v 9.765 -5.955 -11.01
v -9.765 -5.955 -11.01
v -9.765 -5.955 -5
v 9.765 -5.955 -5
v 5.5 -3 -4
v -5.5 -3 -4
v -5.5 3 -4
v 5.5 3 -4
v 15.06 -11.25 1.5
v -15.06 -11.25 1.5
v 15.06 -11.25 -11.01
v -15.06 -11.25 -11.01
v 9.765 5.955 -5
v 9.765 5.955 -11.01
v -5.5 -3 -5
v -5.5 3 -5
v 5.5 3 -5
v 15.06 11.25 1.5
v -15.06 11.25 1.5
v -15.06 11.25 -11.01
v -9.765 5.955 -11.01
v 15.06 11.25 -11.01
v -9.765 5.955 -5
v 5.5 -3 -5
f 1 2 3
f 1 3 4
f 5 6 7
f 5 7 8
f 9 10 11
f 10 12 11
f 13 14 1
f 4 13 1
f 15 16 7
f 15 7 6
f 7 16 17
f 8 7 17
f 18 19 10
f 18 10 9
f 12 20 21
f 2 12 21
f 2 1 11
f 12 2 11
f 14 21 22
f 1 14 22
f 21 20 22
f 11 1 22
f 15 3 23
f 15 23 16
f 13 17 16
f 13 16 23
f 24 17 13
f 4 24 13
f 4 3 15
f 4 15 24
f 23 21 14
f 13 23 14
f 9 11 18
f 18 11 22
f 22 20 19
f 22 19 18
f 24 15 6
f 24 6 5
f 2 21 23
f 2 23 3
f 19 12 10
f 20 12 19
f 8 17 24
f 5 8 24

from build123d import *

# Parameters (mm, degrees)
F0_W     = 30.12
F0_H     = 22.5
F1_DEPTH = 11.01
F2_W     = 19.53
F2_H     = 11.91
F3_DEPTH = 6.01
F4_W     = 11
F4_H     = 6
F5_DEPTH = 1
F6_DEPTH = 1.5


with BuildPart() as f1:
    # F0 (on Top) → F1 (new body)
    with BuildSketch(Plane.XY):
        Rectangle(F0_W, F0_H)
    extrude(amount=-F1_DEPTH)

    # F2 (on face) → F3 (cut)
    with BuildSketch(Plane(origin=(0, 0, -11.01), x_dir=(1, 0, 0), z_dir=(0, 0, -1))):
        Rectangle(F2_W, F2_H)
    extrude(amount=-F3_DEPTH, mode=Mode.SUBTRACT)

    # F4 (on face) → F5 (cut)
    with BuildSketch(Plane(origin=(0, 0, -5), x_dir=(1, 0, 0), z_dir=(0, 0, -1))):
        Rectangle(F4_W, F4_H)
    extrude(amount=-F5_DEPTH, mode=Mode.SUBTRACT)

    # F6 (add): a face of the model
    f6_faces = [f1.faces().sort_by_distance(p)[0] for p in [
        (0, 0, 0),
    ]]
    extrude(f6_faces, amount=F6_DEPTH)


solid = f1.part
